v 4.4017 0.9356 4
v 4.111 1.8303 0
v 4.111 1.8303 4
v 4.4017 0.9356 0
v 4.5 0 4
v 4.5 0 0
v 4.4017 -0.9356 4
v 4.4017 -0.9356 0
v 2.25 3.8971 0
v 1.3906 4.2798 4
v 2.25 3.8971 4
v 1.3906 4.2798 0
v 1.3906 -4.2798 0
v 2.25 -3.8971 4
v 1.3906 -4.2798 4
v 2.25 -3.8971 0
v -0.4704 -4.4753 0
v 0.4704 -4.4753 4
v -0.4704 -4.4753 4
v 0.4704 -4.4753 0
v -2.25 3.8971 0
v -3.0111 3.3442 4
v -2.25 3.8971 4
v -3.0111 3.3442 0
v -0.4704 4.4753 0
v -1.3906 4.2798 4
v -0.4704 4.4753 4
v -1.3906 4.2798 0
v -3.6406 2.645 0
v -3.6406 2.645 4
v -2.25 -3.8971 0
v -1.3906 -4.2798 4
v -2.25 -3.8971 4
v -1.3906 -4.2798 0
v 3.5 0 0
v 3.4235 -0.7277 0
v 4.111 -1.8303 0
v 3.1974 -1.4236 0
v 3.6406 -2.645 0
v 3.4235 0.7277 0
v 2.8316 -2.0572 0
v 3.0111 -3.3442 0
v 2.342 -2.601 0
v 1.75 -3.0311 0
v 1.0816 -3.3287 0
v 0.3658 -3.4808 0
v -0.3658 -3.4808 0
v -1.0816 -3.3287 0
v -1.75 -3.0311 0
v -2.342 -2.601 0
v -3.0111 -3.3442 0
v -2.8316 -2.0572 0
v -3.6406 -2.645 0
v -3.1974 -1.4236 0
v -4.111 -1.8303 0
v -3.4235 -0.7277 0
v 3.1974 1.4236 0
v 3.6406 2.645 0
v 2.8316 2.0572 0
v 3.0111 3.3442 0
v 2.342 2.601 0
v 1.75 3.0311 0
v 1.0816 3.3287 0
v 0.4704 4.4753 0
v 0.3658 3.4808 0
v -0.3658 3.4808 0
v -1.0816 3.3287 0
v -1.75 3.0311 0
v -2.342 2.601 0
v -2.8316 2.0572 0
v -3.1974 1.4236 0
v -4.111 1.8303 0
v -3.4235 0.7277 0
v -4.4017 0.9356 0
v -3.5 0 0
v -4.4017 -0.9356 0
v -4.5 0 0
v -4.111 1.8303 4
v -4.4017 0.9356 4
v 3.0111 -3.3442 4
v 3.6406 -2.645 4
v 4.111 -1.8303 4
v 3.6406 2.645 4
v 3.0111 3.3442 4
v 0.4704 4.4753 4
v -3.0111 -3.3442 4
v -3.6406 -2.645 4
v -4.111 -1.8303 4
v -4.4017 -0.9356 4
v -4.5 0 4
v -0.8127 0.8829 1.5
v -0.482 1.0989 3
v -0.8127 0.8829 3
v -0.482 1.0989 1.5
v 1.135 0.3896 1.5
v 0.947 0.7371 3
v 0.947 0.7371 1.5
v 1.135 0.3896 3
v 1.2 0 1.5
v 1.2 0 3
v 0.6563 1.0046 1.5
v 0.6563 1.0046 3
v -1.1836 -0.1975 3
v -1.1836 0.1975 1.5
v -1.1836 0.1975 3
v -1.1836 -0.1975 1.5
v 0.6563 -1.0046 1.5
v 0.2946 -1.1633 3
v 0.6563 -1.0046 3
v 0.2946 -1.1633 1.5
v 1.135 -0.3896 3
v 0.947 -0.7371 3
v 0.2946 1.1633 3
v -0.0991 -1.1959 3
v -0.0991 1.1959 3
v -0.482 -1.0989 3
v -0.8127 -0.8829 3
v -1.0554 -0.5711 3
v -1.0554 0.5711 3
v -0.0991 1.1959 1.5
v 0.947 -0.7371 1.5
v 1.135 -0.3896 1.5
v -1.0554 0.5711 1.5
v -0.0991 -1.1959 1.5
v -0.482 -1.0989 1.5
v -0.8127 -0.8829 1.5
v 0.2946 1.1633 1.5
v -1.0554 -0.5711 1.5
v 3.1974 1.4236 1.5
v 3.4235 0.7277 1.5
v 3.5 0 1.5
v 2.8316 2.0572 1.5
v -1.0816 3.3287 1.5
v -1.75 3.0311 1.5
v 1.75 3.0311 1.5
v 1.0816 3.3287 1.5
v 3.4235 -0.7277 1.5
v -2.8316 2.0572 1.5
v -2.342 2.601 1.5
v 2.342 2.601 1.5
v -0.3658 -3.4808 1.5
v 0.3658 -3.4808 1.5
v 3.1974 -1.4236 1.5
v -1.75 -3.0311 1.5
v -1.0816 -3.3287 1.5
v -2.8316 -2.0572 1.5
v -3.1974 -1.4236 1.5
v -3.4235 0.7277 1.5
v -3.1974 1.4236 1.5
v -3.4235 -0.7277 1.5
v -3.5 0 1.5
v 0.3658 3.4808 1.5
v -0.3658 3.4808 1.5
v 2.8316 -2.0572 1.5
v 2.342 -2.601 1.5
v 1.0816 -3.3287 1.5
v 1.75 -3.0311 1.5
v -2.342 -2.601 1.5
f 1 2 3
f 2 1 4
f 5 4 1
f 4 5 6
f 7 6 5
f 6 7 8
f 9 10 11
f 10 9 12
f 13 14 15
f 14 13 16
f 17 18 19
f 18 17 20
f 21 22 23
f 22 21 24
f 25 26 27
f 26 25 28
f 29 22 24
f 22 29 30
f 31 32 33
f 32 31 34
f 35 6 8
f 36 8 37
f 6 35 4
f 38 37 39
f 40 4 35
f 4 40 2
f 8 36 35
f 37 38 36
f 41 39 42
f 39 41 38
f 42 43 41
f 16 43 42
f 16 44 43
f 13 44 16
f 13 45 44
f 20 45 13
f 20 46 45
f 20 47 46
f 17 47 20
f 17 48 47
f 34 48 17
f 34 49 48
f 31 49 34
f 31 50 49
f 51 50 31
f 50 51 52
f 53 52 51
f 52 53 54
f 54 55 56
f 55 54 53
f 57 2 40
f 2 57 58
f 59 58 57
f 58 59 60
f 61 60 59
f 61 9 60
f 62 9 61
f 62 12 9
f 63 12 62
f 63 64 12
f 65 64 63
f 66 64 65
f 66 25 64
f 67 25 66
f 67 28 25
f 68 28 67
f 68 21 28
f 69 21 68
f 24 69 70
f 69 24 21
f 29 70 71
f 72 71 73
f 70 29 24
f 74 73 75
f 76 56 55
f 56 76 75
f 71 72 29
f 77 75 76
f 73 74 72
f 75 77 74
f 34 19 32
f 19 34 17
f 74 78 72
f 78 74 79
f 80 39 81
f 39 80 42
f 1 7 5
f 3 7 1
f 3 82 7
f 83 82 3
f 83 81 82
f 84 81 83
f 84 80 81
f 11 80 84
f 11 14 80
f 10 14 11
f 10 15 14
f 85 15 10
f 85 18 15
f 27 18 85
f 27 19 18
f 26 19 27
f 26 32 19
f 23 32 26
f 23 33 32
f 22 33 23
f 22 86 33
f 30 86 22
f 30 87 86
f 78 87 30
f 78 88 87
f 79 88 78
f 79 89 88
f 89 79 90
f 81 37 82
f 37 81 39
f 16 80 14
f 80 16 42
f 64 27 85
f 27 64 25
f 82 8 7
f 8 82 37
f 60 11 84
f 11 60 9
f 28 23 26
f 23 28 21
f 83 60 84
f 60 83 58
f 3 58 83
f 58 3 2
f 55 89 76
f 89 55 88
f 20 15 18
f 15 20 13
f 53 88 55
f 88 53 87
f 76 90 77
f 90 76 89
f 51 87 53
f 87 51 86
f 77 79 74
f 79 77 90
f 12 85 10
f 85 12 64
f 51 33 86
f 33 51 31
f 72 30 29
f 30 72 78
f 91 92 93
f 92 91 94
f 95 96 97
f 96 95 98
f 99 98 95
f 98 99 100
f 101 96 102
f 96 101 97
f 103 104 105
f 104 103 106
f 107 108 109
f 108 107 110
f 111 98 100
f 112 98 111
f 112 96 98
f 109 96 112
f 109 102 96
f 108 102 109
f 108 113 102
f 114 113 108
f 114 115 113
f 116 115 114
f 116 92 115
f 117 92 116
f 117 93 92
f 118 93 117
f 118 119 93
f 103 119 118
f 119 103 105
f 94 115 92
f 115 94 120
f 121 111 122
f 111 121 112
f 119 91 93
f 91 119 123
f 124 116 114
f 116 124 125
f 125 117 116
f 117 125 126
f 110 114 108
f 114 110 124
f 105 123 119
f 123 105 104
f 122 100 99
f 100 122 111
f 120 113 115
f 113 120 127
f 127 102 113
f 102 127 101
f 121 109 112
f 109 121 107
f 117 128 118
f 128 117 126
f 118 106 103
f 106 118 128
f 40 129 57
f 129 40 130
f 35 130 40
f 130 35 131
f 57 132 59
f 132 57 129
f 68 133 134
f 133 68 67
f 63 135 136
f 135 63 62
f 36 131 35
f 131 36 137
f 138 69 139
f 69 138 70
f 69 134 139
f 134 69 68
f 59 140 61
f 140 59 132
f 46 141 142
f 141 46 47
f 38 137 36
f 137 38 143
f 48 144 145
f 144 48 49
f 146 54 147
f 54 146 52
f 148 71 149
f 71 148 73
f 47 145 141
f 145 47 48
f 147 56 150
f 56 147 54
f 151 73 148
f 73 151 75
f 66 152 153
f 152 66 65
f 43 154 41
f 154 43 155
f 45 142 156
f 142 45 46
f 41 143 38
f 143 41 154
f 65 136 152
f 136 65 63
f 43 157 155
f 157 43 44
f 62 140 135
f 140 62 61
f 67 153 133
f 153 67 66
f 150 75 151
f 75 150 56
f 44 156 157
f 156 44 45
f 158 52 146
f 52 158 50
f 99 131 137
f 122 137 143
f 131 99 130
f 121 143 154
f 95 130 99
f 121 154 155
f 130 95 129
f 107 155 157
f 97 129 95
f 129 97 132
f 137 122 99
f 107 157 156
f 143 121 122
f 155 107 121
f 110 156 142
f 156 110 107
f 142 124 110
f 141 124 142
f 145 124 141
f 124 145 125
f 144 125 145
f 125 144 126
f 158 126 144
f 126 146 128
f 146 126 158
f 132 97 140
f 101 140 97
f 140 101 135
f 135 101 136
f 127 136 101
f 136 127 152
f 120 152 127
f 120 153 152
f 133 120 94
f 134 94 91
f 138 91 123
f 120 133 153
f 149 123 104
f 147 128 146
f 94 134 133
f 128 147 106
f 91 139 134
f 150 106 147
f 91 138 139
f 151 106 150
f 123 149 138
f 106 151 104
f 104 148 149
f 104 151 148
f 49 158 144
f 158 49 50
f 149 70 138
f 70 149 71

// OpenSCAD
$fs = 0.4;

H = 4;
RCOL = 2.4 / 2;
RBTN = 9 / 2;

module button_v3() {
  difference() {
    cylinder(h=H, r=RBTN);
    translate([0, 0, -1])
      cylinder(h=H, r=RCOL);
    translate([0, 0, -2.5])
      cylinder(h=H, r=RBTN - 1);
  }
}

button_v3();
